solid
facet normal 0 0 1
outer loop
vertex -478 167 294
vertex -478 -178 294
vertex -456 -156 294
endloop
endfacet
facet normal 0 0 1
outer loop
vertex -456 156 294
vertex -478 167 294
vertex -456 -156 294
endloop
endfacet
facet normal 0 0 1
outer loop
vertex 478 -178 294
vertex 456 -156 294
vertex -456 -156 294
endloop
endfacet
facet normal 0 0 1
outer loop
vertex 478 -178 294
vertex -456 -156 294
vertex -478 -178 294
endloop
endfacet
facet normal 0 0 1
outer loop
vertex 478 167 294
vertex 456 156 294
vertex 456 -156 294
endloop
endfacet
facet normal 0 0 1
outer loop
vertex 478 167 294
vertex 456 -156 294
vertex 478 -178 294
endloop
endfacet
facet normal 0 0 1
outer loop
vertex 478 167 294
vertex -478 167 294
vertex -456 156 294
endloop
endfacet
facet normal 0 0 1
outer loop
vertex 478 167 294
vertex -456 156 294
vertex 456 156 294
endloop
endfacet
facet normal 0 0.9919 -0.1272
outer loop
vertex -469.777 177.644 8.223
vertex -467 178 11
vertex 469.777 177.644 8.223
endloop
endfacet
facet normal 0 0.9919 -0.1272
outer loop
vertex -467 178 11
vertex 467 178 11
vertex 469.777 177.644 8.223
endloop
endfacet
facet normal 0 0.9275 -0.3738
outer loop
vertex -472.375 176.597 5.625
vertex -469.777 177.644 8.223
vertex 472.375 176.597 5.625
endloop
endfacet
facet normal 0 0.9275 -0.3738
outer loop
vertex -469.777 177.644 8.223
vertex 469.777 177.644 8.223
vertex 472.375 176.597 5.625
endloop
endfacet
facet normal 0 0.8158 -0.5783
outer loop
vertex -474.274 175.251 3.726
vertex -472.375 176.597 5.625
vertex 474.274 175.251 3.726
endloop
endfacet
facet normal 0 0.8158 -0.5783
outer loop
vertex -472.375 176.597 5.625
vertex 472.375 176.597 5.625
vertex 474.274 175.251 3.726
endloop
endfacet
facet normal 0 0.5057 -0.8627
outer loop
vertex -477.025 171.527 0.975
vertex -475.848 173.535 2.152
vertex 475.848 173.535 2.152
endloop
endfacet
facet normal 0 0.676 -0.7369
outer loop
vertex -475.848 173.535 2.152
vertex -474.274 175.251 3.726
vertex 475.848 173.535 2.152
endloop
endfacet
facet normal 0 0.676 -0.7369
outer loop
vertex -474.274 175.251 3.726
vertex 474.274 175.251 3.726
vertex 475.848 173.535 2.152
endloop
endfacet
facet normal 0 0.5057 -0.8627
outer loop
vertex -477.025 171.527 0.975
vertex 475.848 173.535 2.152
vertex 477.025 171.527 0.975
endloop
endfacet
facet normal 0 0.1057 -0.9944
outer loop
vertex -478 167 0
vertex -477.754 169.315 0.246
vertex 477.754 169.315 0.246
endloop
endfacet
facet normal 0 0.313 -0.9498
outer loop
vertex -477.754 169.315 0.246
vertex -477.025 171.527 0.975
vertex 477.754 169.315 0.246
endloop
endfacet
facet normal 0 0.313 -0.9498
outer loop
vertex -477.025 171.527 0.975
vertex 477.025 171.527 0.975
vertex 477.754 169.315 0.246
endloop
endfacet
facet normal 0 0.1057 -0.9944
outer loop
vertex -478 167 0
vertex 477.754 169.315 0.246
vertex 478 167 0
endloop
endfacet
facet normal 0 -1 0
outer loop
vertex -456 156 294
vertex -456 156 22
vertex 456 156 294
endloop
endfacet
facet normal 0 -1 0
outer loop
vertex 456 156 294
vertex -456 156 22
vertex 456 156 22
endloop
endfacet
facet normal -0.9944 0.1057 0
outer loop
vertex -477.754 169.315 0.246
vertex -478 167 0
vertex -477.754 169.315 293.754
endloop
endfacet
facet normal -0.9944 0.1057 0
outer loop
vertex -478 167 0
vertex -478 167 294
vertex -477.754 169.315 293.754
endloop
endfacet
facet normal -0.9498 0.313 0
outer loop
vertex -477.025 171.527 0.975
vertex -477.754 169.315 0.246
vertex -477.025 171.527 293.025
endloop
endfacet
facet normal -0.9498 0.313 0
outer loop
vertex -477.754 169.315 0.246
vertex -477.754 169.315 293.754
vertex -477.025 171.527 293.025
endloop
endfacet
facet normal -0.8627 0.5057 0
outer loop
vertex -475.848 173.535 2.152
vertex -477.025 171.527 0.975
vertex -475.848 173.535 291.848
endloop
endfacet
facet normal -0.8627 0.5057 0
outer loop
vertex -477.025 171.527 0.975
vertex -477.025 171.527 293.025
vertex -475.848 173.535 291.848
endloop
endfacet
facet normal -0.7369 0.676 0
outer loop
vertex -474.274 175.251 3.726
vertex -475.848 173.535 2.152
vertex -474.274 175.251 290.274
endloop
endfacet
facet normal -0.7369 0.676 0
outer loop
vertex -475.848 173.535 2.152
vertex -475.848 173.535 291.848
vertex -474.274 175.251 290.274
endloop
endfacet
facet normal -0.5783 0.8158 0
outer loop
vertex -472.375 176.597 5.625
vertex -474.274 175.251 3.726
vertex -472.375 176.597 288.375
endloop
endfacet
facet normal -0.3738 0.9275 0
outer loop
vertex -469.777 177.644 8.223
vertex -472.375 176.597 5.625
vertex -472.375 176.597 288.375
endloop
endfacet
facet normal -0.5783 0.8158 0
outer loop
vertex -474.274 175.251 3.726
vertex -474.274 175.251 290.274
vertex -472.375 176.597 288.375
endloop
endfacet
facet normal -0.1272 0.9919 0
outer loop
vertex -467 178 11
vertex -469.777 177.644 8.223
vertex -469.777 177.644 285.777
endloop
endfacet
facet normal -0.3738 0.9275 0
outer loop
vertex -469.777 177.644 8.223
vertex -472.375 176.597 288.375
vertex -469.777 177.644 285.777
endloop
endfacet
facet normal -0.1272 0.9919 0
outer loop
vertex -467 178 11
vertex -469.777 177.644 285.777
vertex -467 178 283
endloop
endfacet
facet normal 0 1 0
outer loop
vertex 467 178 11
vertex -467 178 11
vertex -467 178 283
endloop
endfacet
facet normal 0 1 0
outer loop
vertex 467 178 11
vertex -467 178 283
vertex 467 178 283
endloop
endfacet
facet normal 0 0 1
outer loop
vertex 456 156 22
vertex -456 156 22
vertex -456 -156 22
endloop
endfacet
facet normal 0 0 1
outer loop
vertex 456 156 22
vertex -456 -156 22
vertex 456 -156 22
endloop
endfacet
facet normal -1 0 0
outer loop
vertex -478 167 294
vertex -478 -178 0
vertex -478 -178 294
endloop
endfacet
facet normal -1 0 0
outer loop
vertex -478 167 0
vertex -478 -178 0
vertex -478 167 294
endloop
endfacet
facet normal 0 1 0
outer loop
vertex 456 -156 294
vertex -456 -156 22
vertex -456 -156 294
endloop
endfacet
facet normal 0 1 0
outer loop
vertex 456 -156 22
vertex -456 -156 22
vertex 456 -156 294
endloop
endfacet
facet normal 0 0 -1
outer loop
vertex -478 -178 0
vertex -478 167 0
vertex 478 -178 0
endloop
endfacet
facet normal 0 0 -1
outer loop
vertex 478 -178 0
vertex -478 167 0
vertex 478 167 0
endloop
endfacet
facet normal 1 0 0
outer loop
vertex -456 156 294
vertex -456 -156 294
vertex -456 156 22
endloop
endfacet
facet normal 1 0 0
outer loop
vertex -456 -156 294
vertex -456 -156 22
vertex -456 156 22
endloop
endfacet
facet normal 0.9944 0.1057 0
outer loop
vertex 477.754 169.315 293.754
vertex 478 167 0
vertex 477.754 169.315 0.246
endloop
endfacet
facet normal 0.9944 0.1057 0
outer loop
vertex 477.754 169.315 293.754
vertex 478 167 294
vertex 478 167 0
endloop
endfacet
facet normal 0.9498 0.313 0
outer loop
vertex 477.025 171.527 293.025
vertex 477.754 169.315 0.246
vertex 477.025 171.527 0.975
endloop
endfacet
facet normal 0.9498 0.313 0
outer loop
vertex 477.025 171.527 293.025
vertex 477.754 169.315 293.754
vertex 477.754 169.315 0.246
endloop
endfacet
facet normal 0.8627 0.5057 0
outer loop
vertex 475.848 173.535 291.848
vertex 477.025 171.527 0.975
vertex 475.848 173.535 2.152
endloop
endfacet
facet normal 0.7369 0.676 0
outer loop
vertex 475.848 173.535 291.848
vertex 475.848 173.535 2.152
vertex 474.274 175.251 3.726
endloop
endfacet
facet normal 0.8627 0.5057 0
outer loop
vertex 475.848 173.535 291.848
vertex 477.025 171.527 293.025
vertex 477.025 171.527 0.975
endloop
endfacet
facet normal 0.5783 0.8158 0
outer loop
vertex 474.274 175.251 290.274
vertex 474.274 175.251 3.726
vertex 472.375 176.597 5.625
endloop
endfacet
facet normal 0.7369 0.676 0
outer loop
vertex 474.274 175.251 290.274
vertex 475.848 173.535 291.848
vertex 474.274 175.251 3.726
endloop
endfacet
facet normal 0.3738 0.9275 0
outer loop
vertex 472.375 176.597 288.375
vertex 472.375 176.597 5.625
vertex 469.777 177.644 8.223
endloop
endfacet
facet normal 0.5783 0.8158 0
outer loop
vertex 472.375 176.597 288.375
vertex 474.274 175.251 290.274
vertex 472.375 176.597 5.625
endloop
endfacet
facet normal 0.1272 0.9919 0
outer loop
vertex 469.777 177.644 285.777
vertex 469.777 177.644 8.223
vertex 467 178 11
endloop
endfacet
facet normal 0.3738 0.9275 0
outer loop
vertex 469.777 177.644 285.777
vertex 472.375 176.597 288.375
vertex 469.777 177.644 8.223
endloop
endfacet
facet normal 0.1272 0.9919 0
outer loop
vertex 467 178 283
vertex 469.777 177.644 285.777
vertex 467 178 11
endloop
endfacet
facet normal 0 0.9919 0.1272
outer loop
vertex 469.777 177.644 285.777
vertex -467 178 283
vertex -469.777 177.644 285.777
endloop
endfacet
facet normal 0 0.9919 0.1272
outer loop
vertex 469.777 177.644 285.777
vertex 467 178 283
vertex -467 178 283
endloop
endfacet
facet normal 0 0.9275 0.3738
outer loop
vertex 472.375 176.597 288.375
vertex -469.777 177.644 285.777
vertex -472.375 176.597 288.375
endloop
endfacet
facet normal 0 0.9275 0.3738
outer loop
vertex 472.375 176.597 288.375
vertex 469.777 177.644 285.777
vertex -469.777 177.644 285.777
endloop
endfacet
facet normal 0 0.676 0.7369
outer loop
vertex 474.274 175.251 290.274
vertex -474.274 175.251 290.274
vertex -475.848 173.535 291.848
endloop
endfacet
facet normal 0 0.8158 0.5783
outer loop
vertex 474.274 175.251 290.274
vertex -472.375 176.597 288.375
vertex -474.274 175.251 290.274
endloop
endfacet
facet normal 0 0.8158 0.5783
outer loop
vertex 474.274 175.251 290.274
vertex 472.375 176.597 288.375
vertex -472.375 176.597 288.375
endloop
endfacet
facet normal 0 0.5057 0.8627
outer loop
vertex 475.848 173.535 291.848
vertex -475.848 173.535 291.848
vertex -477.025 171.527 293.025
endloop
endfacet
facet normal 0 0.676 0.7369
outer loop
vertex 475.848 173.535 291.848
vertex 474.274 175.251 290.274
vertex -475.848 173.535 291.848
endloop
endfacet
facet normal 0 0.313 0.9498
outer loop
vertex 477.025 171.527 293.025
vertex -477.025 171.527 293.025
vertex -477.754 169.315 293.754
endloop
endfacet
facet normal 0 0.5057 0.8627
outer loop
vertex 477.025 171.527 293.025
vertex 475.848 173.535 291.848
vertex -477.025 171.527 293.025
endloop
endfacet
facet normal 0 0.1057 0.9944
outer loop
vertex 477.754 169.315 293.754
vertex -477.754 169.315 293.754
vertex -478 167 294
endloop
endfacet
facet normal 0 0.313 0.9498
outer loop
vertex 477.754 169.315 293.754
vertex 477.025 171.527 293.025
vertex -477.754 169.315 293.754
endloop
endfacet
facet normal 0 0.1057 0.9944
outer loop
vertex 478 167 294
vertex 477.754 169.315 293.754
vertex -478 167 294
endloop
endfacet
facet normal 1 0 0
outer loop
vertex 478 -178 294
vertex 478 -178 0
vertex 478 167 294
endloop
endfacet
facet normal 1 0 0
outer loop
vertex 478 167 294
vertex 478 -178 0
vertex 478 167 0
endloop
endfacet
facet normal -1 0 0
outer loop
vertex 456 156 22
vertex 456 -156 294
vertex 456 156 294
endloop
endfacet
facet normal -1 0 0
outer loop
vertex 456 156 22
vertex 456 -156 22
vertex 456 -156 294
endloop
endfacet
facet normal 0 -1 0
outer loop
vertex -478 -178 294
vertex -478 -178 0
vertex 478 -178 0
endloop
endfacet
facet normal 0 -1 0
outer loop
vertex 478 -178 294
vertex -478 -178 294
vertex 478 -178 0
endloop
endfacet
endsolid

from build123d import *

# Parameters (mm, degrees)
F0_W     = 956
F0_H     = 356
F1_DEPTH = 294
F2_T     = -22
F3_R     = 11


with BuildPart() as f1:
    # F0 (on Top) → F1 (new body)
    with BuildSketch(Plane.XY):
        Rectangle(F0_W, F0_H)
    extrude(amount=F1_DEPTH)

    # F2
    f2_openings = [f1.faces().sort_by_distance(p)[0] for p in [
        (0, 0, 294),
    ]]
    offset(amount=F2_T, openings=f2_openings)

    # F3
    f3_edges = [f1.edges().sort_by_distance(p)[0] for p in [
        (478, 178, 147),
        (-478, 178, 147),
        (0, 178, 0),
        (0, 178, 294),
    ]]
    fillet(f3_edges, radius=F3_R)


solid = f1.part
